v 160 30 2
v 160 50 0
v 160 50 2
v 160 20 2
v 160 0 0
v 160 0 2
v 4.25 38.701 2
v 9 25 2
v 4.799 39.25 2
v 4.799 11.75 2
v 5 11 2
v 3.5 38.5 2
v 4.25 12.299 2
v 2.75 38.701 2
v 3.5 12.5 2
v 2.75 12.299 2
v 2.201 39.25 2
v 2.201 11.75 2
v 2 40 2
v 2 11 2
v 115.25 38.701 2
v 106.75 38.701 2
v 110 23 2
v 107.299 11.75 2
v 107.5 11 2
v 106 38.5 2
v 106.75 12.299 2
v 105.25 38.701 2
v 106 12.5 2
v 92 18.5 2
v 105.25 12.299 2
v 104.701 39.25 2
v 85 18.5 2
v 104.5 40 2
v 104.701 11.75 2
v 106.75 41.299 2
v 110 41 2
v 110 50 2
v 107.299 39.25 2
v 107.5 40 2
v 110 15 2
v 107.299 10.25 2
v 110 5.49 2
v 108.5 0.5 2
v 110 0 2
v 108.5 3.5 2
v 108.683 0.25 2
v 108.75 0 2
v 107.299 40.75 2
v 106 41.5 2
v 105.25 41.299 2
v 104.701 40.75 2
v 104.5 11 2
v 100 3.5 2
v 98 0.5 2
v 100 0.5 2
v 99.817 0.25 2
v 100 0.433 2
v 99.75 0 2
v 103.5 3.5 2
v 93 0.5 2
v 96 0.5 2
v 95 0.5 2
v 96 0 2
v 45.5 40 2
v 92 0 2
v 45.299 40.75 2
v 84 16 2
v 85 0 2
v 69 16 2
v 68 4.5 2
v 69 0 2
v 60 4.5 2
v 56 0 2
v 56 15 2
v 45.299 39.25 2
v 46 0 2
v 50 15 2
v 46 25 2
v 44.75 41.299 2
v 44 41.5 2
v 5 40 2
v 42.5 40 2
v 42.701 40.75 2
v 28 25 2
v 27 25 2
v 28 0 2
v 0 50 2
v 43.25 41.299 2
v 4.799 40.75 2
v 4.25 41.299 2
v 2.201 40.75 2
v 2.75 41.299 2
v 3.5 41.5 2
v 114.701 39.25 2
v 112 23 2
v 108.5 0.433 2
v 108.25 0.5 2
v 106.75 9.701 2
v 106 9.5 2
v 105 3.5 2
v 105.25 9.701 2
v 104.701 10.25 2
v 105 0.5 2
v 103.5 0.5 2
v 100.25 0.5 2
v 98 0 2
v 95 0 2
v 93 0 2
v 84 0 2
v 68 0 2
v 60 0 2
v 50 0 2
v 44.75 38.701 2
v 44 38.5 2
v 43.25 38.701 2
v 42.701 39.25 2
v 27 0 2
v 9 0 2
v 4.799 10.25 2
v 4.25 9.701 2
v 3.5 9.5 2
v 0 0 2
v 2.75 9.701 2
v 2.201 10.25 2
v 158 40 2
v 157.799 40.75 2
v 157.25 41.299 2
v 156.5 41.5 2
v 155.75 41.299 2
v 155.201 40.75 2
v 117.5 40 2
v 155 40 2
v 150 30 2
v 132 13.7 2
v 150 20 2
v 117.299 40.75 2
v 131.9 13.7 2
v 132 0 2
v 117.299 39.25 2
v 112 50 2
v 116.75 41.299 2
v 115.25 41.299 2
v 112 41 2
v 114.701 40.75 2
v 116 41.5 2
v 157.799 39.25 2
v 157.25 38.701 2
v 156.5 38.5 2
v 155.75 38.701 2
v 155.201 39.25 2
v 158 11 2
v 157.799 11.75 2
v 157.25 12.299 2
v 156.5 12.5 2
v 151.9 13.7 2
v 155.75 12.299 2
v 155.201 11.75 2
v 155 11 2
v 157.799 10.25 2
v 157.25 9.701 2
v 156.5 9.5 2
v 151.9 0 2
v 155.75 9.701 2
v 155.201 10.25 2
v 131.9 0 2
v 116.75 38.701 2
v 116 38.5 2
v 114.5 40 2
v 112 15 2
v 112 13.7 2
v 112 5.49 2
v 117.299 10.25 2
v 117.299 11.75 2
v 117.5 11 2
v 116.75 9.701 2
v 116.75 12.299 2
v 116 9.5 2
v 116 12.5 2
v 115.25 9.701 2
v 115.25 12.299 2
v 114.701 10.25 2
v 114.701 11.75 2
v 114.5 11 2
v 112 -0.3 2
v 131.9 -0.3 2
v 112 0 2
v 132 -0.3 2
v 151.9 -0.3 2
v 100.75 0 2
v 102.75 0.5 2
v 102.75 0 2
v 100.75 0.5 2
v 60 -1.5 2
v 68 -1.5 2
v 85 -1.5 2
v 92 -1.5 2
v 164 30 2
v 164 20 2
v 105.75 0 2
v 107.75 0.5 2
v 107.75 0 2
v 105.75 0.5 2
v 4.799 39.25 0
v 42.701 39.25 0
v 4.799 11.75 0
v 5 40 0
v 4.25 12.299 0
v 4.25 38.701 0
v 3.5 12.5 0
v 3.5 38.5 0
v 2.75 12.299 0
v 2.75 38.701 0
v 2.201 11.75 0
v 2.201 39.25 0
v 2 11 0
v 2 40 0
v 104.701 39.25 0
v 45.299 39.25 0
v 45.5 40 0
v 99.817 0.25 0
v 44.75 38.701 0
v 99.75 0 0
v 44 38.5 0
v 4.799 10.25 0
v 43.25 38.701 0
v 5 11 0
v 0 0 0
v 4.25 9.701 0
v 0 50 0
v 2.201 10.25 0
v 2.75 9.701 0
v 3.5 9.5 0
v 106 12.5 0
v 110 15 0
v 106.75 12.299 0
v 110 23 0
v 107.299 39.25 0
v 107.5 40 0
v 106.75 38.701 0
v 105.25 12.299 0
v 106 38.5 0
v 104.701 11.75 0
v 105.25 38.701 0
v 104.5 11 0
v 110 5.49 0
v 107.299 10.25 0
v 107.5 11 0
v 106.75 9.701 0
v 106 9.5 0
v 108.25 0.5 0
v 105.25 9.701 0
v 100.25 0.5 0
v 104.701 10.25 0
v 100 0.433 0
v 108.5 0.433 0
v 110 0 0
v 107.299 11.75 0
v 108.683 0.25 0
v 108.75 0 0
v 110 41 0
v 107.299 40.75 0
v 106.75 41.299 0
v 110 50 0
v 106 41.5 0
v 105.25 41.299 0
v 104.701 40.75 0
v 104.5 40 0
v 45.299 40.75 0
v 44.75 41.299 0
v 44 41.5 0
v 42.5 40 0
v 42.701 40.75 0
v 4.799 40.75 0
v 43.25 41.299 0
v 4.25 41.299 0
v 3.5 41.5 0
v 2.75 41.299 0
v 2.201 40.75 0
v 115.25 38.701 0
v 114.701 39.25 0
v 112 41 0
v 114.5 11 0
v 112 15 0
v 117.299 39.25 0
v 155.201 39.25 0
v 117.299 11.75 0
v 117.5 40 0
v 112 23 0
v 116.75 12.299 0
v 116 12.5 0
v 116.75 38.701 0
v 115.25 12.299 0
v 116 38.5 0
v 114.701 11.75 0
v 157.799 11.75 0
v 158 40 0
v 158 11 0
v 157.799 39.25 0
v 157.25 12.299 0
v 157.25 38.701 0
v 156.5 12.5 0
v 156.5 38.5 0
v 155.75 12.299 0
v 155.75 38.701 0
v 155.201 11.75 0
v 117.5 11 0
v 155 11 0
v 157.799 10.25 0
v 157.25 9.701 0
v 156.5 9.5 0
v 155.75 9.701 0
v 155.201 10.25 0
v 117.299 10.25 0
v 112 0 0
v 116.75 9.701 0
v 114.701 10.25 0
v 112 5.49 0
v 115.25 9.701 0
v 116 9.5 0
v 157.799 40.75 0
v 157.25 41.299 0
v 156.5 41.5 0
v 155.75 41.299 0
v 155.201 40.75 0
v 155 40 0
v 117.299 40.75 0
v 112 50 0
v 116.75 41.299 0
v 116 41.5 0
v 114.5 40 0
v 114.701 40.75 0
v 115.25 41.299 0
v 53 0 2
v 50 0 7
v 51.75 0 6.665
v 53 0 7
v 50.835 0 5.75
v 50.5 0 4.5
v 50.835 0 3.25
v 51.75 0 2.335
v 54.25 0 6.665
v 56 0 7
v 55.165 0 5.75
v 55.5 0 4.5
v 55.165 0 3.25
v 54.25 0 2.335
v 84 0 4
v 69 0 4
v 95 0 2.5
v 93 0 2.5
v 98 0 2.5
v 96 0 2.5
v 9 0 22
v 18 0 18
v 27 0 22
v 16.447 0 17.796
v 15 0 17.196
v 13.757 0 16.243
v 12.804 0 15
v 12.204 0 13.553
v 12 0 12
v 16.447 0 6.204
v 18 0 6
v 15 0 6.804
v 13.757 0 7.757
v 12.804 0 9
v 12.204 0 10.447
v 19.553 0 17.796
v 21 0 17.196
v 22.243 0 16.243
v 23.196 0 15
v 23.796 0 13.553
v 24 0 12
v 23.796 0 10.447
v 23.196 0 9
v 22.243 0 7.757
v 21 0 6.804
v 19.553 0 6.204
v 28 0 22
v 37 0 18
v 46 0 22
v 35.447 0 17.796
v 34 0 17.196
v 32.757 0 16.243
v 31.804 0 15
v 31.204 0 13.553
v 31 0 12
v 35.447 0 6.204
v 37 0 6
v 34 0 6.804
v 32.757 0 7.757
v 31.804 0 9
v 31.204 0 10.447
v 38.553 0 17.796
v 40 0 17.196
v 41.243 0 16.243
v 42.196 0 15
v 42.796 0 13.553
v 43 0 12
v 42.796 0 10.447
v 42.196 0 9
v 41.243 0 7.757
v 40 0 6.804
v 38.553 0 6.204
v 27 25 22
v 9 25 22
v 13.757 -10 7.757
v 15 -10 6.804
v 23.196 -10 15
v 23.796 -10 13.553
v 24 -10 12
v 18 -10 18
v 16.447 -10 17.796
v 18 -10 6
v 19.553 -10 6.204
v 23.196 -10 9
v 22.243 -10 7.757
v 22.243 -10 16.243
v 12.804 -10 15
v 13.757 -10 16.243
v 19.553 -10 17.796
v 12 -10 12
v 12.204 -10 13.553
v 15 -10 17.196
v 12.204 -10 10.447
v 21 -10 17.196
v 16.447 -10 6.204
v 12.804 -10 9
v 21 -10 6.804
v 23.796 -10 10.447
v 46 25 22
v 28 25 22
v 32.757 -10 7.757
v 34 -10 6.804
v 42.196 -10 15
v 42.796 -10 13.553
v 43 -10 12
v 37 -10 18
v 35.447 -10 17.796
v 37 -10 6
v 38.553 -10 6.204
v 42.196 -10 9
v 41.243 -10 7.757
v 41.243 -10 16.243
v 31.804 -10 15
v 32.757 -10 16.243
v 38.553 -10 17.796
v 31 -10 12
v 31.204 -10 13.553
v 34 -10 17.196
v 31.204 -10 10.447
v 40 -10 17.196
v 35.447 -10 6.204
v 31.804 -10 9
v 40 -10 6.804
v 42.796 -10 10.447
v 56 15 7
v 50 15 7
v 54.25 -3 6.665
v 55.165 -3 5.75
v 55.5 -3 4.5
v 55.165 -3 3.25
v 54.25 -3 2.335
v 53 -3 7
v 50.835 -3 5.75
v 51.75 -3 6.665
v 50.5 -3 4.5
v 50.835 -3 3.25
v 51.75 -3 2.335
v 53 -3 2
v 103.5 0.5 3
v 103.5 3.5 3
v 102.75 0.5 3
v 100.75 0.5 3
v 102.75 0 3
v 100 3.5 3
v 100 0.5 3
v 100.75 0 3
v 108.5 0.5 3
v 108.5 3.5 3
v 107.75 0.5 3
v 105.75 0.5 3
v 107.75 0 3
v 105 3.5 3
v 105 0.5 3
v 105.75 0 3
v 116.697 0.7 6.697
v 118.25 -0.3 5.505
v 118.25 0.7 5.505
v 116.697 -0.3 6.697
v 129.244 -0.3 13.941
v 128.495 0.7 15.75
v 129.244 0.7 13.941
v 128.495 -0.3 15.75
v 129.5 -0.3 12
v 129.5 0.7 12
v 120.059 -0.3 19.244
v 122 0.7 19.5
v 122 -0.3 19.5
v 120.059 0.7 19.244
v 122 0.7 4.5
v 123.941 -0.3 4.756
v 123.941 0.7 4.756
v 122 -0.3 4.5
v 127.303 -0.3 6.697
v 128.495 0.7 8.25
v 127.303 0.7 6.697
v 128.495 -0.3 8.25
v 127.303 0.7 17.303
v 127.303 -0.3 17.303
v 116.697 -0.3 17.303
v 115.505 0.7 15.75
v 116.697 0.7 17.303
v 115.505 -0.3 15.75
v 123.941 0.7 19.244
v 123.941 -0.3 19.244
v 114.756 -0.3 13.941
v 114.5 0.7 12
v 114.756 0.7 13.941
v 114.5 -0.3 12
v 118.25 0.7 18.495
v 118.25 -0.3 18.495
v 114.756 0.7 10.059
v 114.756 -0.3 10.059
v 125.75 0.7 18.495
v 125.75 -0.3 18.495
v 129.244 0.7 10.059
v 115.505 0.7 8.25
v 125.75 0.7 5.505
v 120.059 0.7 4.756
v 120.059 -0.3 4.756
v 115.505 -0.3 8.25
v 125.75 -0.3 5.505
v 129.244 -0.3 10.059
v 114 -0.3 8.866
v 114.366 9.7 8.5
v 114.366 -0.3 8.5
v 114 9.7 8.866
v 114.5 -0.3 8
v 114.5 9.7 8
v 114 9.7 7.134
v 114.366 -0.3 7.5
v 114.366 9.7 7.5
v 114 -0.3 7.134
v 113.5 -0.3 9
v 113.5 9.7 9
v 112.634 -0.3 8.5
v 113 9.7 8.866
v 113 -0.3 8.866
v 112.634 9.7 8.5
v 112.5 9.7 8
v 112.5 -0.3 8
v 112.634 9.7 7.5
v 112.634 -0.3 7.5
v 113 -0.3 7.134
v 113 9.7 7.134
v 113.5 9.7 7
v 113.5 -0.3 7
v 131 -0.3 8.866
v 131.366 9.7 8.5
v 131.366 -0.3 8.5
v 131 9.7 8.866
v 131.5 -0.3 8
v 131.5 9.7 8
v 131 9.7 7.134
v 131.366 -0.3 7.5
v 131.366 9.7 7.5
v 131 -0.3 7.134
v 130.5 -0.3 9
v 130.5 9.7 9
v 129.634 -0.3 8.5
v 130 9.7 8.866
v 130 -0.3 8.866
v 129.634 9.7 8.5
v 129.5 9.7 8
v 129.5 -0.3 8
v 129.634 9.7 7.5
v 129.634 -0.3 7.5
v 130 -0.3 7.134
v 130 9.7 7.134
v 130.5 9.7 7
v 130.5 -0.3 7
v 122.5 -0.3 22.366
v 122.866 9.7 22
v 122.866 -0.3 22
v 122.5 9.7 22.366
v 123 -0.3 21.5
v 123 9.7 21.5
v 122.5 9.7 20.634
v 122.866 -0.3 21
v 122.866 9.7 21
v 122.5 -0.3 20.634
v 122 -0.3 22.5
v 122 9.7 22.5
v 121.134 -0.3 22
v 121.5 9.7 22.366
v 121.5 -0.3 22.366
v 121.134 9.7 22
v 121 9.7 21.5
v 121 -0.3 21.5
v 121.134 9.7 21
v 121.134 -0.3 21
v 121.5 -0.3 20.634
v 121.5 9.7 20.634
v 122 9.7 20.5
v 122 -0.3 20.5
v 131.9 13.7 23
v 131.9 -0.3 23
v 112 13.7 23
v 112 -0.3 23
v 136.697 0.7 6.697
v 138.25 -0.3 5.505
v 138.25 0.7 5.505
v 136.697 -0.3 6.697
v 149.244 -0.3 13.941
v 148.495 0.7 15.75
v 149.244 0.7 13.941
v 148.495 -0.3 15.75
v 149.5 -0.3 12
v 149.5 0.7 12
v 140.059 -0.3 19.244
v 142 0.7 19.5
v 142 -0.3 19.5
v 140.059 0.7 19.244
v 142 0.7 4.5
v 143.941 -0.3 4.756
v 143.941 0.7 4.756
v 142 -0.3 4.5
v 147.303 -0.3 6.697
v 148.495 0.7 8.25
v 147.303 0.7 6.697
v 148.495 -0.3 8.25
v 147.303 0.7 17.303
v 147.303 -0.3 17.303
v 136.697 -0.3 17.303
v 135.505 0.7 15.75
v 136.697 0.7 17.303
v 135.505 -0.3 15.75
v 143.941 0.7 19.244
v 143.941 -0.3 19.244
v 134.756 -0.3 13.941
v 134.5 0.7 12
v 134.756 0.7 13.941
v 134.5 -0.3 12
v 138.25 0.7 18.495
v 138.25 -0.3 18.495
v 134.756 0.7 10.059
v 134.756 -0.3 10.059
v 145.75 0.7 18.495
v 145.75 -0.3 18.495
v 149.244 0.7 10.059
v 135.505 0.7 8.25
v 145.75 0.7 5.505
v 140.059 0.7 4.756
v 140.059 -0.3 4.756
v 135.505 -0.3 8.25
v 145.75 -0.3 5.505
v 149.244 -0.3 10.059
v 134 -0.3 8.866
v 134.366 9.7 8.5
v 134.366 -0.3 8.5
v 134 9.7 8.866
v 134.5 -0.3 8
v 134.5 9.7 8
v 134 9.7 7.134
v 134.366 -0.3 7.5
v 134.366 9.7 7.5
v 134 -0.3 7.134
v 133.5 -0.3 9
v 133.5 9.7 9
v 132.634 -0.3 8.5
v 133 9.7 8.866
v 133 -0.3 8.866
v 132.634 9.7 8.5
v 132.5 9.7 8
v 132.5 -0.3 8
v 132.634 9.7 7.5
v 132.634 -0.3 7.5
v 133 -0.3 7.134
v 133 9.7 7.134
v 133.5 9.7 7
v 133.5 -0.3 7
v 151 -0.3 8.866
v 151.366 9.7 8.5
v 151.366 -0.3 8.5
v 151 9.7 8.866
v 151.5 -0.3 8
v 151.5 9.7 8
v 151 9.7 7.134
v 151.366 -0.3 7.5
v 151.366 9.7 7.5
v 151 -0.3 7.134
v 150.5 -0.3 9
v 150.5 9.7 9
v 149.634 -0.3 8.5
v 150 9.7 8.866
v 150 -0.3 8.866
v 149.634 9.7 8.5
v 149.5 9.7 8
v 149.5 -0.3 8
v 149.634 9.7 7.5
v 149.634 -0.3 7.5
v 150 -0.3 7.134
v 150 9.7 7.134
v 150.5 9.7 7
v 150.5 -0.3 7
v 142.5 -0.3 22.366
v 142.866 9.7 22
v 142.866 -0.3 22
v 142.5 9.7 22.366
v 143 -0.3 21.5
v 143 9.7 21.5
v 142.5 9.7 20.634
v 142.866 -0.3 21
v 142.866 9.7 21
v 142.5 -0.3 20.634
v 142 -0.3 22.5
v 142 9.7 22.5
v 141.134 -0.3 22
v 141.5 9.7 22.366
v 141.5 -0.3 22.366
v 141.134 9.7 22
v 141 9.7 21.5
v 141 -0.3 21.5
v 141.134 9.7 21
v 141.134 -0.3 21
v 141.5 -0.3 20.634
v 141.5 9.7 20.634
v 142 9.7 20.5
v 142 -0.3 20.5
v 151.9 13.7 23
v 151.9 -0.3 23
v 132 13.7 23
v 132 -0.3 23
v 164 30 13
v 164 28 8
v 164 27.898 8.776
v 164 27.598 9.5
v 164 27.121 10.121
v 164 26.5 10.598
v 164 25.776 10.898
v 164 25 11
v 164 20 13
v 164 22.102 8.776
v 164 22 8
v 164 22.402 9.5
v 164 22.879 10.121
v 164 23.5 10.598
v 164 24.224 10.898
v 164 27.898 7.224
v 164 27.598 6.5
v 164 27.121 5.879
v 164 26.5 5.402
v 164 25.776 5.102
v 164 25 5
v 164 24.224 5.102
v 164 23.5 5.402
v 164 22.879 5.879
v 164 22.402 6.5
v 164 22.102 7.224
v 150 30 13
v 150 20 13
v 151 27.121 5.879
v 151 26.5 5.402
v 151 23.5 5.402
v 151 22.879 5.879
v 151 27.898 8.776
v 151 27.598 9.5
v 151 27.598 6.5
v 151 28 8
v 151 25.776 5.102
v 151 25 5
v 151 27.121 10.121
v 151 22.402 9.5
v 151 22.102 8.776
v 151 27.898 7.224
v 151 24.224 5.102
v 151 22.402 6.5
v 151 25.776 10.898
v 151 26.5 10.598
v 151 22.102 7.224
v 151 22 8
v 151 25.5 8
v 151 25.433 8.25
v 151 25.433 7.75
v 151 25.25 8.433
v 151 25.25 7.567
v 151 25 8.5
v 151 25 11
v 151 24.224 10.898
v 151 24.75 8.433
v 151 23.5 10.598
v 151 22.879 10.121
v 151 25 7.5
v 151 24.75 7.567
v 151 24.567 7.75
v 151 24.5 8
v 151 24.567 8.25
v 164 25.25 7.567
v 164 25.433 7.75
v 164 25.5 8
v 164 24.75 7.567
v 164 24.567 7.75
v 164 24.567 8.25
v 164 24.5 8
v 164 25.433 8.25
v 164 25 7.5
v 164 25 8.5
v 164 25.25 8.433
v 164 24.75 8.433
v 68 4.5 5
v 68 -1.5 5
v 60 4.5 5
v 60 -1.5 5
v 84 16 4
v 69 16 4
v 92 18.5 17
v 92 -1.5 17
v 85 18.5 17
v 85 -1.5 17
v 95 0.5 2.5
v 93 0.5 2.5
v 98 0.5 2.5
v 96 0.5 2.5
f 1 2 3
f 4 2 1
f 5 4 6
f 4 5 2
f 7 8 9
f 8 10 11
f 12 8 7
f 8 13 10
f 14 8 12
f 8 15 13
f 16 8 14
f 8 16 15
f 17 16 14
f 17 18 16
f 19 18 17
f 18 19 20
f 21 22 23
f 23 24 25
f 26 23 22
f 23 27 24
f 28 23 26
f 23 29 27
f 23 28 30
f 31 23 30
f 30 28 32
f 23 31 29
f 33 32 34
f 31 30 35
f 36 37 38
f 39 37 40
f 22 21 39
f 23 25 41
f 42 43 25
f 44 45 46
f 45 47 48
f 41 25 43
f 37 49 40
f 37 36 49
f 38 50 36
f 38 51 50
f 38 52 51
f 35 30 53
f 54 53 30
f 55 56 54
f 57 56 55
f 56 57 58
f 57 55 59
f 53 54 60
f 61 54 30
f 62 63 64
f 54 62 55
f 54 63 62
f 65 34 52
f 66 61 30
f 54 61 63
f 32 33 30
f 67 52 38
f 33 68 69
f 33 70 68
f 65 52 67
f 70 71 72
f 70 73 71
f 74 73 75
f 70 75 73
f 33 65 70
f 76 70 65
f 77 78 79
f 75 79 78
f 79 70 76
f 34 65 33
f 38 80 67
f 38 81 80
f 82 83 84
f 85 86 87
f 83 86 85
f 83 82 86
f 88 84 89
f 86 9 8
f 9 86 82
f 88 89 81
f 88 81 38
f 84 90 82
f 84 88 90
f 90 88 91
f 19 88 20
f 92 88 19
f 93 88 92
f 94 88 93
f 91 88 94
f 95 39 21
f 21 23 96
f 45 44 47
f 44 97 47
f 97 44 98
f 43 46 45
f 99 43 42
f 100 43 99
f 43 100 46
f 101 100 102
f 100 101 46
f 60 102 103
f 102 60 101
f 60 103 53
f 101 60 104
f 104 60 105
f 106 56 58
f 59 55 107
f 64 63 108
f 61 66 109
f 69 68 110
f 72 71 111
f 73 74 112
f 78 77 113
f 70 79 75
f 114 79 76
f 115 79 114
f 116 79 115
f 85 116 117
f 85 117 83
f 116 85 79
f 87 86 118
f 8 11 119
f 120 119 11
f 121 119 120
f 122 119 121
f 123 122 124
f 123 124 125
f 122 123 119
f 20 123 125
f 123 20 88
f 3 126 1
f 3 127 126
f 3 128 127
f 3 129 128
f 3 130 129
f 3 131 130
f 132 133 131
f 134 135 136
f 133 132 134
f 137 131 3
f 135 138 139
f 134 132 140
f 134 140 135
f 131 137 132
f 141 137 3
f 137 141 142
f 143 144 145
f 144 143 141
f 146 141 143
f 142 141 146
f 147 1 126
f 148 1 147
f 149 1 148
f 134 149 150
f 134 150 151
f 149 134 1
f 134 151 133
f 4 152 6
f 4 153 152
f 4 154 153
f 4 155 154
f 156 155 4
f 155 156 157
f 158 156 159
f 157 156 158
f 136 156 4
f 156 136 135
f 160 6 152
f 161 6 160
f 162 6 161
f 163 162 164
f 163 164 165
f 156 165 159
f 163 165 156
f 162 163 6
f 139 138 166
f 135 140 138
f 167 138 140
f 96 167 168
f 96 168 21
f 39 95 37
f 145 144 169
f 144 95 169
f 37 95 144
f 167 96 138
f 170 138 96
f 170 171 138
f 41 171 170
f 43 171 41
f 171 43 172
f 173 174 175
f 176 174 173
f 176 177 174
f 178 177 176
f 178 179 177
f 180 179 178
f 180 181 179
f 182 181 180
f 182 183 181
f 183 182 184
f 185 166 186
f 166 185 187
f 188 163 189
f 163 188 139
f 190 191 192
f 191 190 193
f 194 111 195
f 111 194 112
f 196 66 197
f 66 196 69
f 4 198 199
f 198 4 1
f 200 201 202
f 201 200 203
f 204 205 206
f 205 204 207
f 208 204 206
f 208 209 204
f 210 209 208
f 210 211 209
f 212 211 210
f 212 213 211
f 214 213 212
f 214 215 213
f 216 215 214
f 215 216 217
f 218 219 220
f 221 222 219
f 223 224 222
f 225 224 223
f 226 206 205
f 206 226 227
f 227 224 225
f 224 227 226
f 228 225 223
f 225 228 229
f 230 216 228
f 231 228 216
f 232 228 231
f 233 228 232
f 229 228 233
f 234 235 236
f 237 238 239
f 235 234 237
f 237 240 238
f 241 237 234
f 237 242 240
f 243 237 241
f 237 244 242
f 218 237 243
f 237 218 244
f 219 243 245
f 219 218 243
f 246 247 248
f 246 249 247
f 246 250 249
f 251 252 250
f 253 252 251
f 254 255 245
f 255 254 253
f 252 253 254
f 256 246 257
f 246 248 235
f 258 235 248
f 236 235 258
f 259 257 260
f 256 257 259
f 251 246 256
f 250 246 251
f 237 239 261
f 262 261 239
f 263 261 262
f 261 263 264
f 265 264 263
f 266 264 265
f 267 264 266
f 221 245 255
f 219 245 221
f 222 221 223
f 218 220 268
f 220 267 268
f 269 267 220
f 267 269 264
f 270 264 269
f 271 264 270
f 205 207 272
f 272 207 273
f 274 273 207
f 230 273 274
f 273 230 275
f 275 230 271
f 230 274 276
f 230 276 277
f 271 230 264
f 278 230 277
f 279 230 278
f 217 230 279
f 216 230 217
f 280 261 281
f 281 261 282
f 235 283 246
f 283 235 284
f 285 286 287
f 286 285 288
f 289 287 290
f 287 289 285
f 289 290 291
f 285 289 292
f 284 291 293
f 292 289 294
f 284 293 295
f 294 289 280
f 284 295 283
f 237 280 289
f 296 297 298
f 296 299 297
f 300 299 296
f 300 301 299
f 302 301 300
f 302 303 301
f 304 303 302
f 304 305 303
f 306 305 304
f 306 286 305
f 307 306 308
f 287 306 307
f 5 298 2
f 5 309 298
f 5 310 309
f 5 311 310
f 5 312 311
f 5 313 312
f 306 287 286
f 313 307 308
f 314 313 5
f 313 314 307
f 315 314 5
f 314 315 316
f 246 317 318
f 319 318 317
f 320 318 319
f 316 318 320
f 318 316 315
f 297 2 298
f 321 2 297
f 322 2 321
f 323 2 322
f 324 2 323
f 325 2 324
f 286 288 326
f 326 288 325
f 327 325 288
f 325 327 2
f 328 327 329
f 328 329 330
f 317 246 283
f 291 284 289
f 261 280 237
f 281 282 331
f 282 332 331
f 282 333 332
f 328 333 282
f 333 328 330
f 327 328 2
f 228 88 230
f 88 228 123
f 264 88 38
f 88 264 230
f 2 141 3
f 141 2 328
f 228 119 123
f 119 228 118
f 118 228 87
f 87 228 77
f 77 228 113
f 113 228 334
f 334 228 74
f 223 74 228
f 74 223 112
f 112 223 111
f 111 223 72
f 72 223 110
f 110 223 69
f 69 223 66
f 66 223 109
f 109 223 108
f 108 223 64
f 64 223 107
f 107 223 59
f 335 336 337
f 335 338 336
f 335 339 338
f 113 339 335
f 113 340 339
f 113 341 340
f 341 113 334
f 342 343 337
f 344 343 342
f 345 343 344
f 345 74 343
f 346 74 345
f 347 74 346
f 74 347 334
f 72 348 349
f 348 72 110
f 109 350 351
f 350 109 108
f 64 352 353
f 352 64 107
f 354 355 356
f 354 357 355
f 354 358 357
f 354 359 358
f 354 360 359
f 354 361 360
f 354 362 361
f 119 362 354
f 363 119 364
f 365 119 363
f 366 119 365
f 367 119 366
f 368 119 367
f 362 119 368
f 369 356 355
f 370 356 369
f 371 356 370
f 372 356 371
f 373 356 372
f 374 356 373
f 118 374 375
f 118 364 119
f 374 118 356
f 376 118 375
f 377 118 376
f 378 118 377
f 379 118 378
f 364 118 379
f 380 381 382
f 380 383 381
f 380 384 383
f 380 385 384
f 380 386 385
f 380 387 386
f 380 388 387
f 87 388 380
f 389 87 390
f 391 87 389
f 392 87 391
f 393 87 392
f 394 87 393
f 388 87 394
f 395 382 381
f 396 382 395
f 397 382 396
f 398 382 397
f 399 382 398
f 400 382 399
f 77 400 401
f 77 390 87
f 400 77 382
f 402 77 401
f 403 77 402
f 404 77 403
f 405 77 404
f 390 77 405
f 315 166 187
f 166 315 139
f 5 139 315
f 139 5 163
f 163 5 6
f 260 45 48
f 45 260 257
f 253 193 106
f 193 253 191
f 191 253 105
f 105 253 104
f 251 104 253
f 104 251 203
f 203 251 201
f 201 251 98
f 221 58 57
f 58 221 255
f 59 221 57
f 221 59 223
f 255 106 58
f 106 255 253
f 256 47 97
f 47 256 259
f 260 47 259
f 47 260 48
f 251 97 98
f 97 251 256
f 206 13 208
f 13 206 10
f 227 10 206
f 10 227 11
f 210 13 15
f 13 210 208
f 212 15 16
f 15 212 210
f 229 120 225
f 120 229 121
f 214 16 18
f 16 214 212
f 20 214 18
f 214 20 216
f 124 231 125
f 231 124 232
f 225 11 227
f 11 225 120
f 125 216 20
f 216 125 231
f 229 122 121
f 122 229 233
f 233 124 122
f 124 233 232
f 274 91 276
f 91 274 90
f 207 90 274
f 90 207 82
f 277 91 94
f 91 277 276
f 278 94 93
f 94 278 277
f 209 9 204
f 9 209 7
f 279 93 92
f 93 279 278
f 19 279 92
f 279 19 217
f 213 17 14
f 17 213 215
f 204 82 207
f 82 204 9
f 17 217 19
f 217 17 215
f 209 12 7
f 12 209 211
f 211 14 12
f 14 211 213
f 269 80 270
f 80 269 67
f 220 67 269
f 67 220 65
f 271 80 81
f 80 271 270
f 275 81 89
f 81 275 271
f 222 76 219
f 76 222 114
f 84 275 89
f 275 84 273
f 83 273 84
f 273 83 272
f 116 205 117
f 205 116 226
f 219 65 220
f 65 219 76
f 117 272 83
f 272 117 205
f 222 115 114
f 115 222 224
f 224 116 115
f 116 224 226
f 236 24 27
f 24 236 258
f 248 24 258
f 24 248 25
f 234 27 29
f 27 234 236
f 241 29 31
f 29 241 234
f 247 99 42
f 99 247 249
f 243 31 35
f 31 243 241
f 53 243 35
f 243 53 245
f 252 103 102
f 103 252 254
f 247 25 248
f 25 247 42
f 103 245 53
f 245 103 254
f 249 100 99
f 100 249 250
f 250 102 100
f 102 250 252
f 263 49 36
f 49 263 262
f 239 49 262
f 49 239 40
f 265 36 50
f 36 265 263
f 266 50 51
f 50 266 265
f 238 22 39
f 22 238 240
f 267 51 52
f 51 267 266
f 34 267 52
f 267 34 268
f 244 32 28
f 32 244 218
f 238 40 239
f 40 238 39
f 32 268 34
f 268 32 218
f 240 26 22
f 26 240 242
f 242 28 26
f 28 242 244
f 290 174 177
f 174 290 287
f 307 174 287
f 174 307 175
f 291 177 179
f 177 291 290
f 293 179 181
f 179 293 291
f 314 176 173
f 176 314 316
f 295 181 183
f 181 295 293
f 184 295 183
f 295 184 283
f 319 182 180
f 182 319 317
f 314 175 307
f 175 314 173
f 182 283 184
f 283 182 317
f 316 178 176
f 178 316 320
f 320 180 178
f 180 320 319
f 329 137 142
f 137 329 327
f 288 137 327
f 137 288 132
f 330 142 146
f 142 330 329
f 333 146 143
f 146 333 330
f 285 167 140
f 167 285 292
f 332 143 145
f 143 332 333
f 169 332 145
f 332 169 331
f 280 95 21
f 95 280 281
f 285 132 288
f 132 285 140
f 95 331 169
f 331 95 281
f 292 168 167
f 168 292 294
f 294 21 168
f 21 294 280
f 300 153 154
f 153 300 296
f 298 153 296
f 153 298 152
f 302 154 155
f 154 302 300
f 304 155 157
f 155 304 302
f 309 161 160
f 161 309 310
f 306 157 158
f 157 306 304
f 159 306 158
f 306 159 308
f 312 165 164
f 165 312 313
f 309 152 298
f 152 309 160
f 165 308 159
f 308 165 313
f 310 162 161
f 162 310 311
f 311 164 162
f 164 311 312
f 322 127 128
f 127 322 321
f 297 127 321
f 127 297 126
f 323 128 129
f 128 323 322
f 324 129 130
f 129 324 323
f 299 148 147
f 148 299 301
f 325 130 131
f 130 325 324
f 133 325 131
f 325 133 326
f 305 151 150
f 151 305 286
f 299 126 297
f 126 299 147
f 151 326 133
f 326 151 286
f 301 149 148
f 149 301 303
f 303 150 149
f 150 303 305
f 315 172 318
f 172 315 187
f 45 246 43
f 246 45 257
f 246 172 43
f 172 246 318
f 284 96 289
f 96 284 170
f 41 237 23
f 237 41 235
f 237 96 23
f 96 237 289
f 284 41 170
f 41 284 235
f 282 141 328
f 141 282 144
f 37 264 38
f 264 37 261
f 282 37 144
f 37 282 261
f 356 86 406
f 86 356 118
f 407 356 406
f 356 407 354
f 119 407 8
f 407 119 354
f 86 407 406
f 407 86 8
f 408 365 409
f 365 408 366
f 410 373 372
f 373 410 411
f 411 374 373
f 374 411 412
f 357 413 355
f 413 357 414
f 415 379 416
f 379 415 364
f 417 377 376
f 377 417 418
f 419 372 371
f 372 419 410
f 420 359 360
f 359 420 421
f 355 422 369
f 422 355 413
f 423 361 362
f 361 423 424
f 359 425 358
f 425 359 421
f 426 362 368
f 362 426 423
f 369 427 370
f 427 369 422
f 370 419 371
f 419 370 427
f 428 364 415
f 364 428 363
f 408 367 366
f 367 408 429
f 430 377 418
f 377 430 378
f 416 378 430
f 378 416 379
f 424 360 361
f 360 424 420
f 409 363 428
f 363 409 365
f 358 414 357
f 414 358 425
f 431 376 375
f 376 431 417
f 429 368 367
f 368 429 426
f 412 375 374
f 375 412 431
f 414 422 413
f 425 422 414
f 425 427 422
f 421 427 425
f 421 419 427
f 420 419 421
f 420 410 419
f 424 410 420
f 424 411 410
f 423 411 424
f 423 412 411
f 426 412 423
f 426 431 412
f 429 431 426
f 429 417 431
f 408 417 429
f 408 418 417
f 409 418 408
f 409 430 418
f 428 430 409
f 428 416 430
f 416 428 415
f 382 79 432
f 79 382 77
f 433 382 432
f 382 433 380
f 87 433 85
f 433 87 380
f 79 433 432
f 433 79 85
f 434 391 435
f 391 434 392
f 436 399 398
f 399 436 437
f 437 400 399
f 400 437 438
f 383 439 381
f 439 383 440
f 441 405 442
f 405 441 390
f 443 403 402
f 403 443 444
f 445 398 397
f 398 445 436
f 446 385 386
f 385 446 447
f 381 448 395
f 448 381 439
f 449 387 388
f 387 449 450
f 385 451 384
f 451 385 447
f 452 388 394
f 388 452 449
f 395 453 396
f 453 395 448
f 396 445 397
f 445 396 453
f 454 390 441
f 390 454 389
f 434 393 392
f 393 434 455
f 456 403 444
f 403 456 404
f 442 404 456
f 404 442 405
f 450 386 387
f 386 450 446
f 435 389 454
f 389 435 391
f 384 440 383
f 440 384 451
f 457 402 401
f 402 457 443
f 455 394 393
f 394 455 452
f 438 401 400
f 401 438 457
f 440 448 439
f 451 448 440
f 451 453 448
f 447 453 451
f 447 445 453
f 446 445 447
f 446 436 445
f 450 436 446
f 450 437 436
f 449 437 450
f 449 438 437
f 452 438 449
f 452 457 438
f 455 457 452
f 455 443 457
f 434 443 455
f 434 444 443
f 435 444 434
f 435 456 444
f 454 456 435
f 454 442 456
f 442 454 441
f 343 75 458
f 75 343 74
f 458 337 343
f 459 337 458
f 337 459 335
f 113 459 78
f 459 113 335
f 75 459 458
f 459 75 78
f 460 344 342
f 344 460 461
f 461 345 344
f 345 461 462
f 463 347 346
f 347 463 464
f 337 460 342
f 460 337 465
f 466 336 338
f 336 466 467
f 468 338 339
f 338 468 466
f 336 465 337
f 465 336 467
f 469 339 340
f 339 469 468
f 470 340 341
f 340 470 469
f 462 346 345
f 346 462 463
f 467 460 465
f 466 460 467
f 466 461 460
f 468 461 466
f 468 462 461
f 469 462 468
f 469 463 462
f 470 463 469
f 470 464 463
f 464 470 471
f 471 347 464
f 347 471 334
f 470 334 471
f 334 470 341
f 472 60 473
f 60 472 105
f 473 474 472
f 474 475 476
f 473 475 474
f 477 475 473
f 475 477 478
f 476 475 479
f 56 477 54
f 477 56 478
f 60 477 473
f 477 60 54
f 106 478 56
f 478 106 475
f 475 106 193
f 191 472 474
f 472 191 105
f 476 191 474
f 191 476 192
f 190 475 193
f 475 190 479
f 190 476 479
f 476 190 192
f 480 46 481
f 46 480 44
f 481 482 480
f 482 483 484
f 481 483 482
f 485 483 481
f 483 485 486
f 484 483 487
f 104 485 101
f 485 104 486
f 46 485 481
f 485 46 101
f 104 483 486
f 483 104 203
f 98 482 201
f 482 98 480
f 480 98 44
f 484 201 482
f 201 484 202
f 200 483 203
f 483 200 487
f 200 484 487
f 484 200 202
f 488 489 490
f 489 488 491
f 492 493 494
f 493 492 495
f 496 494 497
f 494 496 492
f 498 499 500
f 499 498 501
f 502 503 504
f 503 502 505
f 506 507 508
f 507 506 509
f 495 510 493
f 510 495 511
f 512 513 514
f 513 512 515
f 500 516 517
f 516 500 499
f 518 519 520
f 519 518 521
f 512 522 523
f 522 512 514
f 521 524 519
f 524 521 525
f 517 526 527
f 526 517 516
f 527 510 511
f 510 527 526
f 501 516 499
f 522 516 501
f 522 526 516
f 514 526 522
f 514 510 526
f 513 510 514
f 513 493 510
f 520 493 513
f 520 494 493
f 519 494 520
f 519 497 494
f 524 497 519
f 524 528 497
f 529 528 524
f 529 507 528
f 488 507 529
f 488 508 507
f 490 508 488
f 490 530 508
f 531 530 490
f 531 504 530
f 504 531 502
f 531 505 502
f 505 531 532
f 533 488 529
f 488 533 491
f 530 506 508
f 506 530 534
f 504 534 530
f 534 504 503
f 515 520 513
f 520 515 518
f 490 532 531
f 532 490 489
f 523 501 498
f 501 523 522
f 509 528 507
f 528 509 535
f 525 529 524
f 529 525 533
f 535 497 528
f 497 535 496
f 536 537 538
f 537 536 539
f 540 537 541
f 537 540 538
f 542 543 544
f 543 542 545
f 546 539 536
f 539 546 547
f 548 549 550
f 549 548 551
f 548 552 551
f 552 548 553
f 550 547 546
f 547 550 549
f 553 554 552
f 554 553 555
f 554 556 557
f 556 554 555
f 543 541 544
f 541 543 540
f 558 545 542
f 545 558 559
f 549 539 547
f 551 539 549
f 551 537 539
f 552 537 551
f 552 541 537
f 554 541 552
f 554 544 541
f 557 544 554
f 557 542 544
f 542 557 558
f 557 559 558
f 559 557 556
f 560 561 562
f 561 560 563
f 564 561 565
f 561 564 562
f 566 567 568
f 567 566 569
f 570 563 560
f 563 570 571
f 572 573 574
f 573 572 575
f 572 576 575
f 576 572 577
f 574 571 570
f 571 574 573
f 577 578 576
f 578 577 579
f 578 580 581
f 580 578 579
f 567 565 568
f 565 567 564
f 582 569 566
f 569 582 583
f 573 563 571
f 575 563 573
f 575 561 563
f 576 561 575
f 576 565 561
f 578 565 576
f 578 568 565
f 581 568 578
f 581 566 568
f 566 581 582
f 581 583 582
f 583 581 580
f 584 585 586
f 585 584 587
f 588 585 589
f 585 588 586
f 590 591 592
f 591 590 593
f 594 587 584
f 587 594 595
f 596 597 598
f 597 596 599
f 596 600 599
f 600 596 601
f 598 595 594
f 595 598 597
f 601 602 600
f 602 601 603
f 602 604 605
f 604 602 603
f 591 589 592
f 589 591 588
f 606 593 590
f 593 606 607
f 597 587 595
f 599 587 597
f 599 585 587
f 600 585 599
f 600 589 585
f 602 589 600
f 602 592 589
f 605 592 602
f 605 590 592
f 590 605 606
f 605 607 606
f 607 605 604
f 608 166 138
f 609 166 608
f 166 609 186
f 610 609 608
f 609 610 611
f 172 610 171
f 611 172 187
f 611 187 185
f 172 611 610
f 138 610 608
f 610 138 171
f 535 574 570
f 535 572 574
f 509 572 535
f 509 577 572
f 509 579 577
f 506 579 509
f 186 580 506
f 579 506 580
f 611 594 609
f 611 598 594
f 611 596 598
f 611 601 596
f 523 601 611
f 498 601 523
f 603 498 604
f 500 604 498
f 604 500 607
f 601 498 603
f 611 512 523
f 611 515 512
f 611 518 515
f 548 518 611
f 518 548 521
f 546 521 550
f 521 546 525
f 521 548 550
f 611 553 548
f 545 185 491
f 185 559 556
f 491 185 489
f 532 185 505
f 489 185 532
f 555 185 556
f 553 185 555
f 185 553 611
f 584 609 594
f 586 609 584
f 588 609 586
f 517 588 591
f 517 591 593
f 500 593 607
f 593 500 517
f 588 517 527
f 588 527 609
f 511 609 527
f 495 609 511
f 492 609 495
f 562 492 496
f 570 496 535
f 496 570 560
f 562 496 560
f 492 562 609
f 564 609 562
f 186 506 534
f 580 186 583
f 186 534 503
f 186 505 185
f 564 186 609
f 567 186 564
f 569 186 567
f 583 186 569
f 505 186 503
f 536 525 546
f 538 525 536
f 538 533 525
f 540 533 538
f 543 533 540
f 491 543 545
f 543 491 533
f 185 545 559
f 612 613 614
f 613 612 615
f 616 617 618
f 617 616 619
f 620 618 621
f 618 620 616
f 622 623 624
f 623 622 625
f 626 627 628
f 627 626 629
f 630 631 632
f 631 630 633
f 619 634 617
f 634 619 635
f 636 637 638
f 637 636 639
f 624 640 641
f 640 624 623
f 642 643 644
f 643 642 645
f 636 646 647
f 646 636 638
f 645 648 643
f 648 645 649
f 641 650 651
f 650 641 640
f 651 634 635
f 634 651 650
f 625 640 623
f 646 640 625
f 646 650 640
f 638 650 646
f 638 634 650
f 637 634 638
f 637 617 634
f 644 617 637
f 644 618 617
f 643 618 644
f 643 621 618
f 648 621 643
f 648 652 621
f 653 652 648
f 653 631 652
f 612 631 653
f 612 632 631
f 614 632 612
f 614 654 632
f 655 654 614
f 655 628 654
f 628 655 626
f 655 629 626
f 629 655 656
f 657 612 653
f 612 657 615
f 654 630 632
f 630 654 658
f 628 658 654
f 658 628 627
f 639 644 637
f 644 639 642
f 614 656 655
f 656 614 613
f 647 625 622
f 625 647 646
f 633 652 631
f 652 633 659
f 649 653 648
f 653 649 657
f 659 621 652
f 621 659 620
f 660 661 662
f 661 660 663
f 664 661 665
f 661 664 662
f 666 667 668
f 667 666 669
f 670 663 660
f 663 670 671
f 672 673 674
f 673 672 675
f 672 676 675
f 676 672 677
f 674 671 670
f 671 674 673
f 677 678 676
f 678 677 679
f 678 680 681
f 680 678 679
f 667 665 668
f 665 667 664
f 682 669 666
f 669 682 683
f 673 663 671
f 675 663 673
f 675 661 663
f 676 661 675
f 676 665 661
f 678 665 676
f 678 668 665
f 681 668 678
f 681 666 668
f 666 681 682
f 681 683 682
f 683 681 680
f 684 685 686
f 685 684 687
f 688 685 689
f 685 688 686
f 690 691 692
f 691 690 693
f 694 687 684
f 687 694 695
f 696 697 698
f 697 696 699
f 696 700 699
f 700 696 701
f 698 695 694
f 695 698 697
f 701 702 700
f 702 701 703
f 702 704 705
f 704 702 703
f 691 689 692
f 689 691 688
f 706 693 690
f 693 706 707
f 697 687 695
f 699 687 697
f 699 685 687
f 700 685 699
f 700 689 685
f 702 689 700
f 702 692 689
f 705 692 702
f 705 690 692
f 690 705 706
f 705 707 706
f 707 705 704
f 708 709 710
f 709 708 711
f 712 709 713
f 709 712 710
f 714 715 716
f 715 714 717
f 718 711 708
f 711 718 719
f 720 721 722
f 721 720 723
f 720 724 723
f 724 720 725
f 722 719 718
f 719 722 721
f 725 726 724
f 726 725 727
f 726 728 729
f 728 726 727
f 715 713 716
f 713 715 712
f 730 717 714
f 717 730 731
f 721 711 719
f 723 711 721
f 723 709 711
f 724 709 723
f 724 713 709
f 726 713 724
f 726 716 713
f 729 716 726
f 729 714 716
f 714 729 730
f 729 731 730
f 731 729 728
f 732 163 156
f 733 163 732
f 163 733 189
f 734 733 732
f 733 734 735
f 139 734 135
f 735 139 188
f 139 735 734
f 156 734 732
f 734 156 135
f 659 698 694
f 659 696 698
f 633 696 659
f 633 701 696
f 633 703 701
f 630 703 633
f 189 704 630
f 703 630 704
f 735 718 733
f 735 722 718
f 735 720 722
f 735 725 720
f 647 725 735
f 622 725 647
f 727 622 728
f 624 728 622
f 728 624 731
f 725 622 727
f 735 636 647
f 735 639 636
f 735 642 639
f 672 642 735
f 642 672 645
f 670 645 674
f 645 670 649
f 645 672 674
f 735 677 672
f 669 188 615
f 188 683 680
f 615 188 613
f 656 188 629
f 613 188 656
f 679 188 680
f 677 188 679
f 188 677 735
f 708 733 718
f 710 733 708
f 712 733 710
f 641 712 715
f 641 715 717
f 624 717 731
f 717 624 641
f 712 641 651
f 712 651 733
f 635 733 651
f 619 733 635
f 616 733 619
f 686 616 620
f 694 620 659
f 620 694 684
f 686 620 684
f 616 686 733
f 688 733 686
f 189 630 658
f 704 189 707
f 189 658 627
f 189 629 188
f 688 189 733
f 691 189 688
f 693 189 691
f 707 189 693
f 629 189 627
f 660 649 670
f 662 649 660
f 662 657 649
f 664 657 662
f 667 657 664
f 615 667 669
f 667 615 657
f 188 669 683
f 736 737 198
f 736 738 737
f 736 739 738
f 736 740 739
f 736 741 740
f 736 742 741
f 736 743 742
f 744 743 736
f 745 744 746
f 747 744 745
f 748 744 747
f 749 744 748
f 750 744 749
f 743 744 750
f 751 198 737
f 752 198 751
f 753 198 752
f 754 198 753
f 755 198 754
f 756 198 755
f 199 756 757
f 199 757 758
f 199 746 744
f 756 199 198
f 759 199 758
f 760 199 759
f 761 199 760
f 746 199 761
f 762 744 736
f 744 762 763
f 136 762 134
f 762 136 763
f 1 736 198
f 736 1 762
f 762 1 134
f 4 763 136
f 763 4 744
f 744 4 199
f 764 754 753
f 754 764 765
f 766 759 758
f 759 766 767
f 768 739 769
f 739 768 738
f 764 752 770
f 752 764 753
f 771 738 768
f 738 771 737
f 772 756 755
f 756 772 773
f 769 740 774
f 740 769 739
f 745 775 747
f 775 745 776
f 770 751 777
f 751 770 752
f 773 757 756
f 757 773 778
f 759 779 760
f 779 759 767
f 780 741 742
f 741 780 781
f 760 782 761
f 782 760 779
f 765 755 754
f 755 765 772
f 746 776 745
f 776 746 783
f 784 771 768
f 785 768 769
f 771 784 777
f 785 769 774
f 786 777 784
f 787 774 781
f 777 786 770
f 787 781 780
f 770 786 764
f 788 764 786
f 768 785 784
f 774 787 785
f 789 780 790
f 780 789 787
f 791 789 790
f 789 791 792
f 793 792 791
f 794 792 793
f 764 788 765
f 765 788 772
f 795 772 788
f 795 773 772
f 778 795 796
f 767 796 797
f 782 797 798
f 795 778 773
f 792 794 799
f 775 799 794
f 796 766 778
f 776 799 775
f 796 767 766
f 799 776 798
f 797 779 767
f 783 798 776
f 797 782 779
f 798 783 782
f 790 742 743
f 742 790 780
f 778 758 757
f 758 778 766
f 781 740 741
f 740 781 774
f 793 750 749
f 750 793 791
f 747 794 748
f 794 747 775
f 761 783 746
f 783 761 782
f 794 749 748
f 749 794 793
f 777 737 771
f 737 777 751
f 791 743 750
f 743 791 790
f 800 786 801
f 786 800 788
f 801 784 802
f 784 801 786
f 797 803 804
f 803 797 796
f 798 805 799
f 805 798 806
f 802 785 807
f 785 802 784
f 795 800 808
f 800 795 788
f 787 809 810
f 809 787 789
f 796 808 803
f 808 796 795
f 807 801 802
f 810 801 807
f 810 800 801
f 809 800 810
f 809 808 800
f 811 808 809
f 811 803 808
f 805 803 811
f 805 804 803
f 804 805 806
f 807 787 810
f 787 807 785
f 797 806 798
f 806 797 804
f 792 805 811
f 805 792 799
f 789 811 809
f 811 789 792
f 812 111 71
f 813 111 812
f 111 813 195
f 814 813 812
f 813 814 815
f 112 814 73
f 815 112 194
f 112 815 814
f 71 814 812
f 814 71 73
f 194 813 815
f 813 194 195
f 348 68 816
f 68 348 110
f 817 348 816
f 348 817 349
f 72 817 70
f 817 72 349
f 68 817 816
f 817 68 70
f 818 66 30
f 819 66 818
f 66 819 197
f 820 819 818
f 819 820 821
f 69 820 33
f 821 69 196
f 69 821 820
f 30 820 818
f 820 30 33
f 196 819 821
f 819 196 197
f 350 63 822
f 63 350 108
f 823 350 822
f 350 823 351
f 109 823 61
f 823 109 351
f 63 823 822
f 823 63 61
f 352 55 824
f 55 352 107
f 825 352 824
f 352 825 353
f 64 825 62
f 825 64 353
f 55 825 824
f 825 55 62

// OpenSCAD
module axoloti_board(ex=0) {
    // axoloti board
    difference() {
        cube([160,50,2]);
        // recess at switches
        translate([104.25, 0, 0]) cube(size=[8, 1, 10], center=true);
        translate([100.25, 0, 0]) cylinder(r=1/2, h=10, center=true, $fn=12);
        translate([108.25, 0, 0]) cylinder(r=1/2, h=10, center=true, $fn=12);
        // mounting holes
        translate([3.5, 11, 0]) cylinder(r=3/2, h=10, center=true, $fn=12);
        translate([3.5, 40, 0]) cylinder(r=3/2, h=10, center=true, $fn=12);
        translate([44, 40, 0]) cylinder(r=3/2, h=10, center=true, $fn=12);
        translate([106, 11, 0]) cylinder(r=3/2, h=10, center=true, $fn=12);
        translate([106, 40, 0]) cylinder(r=3/2, h=10, center=true, $fn=12);
        translate([116, 11, 0]) cylinder(r=3/2, h=10, center=true, $fn=12);
        translate([116, 40, 0]) cylinder(r=3/2, h=10, center=true, $fn=12);
        translate([156.5, 11, 0]) cylinder(r=3/2, h=10, center=true, $fn=12);
        translate([156.5, 40, 0]) cylinder(r=3/2, h=10, center=true, $fn=12);
        // split
        translate([110, -.01, -5]) cube(size=[2, 5.5, 10]);
        translate([110, 15, -5]) cube(size=[2, 8, 10]);
        translate([110, 41, -5]) cube(size=[2, 18, 10]);
    }
    translate([0,0,2]) color([.4,1,.4,1]) {
        // IN 6.3 jack
        translate([9,0,0]) {
            cube([18,25,20]);
            translate([18/2,10,10]) rotate([90,0,0]) cylinder(h=20+ex, r=12/2, $fn=24);
        }
        // OUT 6.3 jack
        translate([28,0,0]) {
            cube([18,25,20]);
            translate([18/2,20/2,10]) rotate([90,0,0]) cylinder(h=20+ex, r=12/2, $fn=24);
        }
        // headphone jack
        translate([50,0,0]) {
            cube([6,15,5]);
            translate([6/2,6/2,5/2]) rotate([90,0,0]) cylinder(h=6+ex, r=5/2, $fn=12);
        }
        // micro usb
        translate([60,-1.5-ex,0]) {
            cube([8,6+ex,3]);
        }
        // uSD
        translate([69,0-ex,0]) {
            cube([15,16+ex,2]);
        }
        // USB
        translate([85,-1.5-ex,0]) {
            cube([7,20+ex,15]);
        }
        // LED2
        translate([93,0,0]) {
            cube(size=[2, .5, .5]);
        }
        // LED1
        translate([96,0,0]) {
            cube(size=[2, .5, .5]);
        }
        // S2
        translate([100,0,0]) {
            translate([0, .5, 0]) cube(size=[3.5, 3, 1]);
            translate([1.5/2, 0, 0]) cube(size=[2, 1, 1]);
            if (ex>0) {
                translate([6/2,6/2,5/2]) rotate([90,0,0]) cylinder(h=6+ex, r=5/2, $fn=12);
            }
        }
        // S1
        translate([105,0,0]) {
            translate([0, .5, 0]) cube(size=[3.5, 3, 1]);
            translate([1.5/2, 0, 0]) cube(size=[2, 1, 1]);
            if (ex>0) {
                translate([6/2,6/2,5/2]) rotate([90,0,0]) cylinder(h=6+ex, r=5/2, $fn=12);
            }
        }
        // MIDI IN
        translate([112,-.3,0]) {
            difference(){
                if (ex==0) {
                    translate([0, 0-ex, 0]) cube(size=[20-.1, 14+ex, 21]);
                } else {
                    translate([0, 0-ex, 0]) cube(size=[20-.1+.2, 14+ex, 21]);
                }
                if (ex==0) {
                    translate([20/2, 0, 20/2]) rotate([90, 0, 0]) cylinder(r=15/2, h=2, center=true);
                    translate([1.5, 0, 6]) rotate([90, 0, 0]) cylinder(r=2/2, h=20, center=true, $fn=12);
                    translate([20-1.5, 0, 6]) rotate([90, 0, 0]) cylinder(r=2/2, h=20, center=true, $fn=12);
                    translate([20/2, 0, 21-1.5]) rotate([90, 0, 0]) cylinder(r=2/2, h=20, center=true, $fn=12);
                }
            }
        }
        // MIDI OUT
        translate([132,-.3,0]) {
            difference(){
                translate([0, 0-ex, 0]) cube(size=[20-.1, 14+ex, 21]);
                if (ex==0) {
                    translate([20/2, 0, 20/2]) rotate([90, 0, 0]) cylinder(r=15/2, h=2, center=true);
                    translate([1.5, 0, 6]) rotate([90, 0, 0]) cylinder(r=2/2, h=20, center=true, $fn=12);
                    translate([20-1.5, 0, 6]) rotate([90, 0, 0]) cylinder(r=2/2, h=20, center=true, $fn=12);
                    translate([20/2, 0, 21-1.5]) rotate([90, 0, 0]) cylinder(r=2/2, h=20, center=true, $fn=12);
                }
            }
        }
        // Power
        translate([160,20,0]) {
            translate([-10, 0, 0]) {
                difference(){
                    cube(size=[14+ex, 10, 11]);
                    if (ex==0) {
                        translate([8, 10/2, 6]) rotate([0, 90, 0]) cylinder(r=6/2, h=14, center=true, $fn=24);
                    }
                }
                translate([7, 10/2, 6]) rotate([0, 90, 0]) cylinder(r=1/2, h=14, center=true, $fn=12);

            }
        }
    }
} // module

axoloti_board();
